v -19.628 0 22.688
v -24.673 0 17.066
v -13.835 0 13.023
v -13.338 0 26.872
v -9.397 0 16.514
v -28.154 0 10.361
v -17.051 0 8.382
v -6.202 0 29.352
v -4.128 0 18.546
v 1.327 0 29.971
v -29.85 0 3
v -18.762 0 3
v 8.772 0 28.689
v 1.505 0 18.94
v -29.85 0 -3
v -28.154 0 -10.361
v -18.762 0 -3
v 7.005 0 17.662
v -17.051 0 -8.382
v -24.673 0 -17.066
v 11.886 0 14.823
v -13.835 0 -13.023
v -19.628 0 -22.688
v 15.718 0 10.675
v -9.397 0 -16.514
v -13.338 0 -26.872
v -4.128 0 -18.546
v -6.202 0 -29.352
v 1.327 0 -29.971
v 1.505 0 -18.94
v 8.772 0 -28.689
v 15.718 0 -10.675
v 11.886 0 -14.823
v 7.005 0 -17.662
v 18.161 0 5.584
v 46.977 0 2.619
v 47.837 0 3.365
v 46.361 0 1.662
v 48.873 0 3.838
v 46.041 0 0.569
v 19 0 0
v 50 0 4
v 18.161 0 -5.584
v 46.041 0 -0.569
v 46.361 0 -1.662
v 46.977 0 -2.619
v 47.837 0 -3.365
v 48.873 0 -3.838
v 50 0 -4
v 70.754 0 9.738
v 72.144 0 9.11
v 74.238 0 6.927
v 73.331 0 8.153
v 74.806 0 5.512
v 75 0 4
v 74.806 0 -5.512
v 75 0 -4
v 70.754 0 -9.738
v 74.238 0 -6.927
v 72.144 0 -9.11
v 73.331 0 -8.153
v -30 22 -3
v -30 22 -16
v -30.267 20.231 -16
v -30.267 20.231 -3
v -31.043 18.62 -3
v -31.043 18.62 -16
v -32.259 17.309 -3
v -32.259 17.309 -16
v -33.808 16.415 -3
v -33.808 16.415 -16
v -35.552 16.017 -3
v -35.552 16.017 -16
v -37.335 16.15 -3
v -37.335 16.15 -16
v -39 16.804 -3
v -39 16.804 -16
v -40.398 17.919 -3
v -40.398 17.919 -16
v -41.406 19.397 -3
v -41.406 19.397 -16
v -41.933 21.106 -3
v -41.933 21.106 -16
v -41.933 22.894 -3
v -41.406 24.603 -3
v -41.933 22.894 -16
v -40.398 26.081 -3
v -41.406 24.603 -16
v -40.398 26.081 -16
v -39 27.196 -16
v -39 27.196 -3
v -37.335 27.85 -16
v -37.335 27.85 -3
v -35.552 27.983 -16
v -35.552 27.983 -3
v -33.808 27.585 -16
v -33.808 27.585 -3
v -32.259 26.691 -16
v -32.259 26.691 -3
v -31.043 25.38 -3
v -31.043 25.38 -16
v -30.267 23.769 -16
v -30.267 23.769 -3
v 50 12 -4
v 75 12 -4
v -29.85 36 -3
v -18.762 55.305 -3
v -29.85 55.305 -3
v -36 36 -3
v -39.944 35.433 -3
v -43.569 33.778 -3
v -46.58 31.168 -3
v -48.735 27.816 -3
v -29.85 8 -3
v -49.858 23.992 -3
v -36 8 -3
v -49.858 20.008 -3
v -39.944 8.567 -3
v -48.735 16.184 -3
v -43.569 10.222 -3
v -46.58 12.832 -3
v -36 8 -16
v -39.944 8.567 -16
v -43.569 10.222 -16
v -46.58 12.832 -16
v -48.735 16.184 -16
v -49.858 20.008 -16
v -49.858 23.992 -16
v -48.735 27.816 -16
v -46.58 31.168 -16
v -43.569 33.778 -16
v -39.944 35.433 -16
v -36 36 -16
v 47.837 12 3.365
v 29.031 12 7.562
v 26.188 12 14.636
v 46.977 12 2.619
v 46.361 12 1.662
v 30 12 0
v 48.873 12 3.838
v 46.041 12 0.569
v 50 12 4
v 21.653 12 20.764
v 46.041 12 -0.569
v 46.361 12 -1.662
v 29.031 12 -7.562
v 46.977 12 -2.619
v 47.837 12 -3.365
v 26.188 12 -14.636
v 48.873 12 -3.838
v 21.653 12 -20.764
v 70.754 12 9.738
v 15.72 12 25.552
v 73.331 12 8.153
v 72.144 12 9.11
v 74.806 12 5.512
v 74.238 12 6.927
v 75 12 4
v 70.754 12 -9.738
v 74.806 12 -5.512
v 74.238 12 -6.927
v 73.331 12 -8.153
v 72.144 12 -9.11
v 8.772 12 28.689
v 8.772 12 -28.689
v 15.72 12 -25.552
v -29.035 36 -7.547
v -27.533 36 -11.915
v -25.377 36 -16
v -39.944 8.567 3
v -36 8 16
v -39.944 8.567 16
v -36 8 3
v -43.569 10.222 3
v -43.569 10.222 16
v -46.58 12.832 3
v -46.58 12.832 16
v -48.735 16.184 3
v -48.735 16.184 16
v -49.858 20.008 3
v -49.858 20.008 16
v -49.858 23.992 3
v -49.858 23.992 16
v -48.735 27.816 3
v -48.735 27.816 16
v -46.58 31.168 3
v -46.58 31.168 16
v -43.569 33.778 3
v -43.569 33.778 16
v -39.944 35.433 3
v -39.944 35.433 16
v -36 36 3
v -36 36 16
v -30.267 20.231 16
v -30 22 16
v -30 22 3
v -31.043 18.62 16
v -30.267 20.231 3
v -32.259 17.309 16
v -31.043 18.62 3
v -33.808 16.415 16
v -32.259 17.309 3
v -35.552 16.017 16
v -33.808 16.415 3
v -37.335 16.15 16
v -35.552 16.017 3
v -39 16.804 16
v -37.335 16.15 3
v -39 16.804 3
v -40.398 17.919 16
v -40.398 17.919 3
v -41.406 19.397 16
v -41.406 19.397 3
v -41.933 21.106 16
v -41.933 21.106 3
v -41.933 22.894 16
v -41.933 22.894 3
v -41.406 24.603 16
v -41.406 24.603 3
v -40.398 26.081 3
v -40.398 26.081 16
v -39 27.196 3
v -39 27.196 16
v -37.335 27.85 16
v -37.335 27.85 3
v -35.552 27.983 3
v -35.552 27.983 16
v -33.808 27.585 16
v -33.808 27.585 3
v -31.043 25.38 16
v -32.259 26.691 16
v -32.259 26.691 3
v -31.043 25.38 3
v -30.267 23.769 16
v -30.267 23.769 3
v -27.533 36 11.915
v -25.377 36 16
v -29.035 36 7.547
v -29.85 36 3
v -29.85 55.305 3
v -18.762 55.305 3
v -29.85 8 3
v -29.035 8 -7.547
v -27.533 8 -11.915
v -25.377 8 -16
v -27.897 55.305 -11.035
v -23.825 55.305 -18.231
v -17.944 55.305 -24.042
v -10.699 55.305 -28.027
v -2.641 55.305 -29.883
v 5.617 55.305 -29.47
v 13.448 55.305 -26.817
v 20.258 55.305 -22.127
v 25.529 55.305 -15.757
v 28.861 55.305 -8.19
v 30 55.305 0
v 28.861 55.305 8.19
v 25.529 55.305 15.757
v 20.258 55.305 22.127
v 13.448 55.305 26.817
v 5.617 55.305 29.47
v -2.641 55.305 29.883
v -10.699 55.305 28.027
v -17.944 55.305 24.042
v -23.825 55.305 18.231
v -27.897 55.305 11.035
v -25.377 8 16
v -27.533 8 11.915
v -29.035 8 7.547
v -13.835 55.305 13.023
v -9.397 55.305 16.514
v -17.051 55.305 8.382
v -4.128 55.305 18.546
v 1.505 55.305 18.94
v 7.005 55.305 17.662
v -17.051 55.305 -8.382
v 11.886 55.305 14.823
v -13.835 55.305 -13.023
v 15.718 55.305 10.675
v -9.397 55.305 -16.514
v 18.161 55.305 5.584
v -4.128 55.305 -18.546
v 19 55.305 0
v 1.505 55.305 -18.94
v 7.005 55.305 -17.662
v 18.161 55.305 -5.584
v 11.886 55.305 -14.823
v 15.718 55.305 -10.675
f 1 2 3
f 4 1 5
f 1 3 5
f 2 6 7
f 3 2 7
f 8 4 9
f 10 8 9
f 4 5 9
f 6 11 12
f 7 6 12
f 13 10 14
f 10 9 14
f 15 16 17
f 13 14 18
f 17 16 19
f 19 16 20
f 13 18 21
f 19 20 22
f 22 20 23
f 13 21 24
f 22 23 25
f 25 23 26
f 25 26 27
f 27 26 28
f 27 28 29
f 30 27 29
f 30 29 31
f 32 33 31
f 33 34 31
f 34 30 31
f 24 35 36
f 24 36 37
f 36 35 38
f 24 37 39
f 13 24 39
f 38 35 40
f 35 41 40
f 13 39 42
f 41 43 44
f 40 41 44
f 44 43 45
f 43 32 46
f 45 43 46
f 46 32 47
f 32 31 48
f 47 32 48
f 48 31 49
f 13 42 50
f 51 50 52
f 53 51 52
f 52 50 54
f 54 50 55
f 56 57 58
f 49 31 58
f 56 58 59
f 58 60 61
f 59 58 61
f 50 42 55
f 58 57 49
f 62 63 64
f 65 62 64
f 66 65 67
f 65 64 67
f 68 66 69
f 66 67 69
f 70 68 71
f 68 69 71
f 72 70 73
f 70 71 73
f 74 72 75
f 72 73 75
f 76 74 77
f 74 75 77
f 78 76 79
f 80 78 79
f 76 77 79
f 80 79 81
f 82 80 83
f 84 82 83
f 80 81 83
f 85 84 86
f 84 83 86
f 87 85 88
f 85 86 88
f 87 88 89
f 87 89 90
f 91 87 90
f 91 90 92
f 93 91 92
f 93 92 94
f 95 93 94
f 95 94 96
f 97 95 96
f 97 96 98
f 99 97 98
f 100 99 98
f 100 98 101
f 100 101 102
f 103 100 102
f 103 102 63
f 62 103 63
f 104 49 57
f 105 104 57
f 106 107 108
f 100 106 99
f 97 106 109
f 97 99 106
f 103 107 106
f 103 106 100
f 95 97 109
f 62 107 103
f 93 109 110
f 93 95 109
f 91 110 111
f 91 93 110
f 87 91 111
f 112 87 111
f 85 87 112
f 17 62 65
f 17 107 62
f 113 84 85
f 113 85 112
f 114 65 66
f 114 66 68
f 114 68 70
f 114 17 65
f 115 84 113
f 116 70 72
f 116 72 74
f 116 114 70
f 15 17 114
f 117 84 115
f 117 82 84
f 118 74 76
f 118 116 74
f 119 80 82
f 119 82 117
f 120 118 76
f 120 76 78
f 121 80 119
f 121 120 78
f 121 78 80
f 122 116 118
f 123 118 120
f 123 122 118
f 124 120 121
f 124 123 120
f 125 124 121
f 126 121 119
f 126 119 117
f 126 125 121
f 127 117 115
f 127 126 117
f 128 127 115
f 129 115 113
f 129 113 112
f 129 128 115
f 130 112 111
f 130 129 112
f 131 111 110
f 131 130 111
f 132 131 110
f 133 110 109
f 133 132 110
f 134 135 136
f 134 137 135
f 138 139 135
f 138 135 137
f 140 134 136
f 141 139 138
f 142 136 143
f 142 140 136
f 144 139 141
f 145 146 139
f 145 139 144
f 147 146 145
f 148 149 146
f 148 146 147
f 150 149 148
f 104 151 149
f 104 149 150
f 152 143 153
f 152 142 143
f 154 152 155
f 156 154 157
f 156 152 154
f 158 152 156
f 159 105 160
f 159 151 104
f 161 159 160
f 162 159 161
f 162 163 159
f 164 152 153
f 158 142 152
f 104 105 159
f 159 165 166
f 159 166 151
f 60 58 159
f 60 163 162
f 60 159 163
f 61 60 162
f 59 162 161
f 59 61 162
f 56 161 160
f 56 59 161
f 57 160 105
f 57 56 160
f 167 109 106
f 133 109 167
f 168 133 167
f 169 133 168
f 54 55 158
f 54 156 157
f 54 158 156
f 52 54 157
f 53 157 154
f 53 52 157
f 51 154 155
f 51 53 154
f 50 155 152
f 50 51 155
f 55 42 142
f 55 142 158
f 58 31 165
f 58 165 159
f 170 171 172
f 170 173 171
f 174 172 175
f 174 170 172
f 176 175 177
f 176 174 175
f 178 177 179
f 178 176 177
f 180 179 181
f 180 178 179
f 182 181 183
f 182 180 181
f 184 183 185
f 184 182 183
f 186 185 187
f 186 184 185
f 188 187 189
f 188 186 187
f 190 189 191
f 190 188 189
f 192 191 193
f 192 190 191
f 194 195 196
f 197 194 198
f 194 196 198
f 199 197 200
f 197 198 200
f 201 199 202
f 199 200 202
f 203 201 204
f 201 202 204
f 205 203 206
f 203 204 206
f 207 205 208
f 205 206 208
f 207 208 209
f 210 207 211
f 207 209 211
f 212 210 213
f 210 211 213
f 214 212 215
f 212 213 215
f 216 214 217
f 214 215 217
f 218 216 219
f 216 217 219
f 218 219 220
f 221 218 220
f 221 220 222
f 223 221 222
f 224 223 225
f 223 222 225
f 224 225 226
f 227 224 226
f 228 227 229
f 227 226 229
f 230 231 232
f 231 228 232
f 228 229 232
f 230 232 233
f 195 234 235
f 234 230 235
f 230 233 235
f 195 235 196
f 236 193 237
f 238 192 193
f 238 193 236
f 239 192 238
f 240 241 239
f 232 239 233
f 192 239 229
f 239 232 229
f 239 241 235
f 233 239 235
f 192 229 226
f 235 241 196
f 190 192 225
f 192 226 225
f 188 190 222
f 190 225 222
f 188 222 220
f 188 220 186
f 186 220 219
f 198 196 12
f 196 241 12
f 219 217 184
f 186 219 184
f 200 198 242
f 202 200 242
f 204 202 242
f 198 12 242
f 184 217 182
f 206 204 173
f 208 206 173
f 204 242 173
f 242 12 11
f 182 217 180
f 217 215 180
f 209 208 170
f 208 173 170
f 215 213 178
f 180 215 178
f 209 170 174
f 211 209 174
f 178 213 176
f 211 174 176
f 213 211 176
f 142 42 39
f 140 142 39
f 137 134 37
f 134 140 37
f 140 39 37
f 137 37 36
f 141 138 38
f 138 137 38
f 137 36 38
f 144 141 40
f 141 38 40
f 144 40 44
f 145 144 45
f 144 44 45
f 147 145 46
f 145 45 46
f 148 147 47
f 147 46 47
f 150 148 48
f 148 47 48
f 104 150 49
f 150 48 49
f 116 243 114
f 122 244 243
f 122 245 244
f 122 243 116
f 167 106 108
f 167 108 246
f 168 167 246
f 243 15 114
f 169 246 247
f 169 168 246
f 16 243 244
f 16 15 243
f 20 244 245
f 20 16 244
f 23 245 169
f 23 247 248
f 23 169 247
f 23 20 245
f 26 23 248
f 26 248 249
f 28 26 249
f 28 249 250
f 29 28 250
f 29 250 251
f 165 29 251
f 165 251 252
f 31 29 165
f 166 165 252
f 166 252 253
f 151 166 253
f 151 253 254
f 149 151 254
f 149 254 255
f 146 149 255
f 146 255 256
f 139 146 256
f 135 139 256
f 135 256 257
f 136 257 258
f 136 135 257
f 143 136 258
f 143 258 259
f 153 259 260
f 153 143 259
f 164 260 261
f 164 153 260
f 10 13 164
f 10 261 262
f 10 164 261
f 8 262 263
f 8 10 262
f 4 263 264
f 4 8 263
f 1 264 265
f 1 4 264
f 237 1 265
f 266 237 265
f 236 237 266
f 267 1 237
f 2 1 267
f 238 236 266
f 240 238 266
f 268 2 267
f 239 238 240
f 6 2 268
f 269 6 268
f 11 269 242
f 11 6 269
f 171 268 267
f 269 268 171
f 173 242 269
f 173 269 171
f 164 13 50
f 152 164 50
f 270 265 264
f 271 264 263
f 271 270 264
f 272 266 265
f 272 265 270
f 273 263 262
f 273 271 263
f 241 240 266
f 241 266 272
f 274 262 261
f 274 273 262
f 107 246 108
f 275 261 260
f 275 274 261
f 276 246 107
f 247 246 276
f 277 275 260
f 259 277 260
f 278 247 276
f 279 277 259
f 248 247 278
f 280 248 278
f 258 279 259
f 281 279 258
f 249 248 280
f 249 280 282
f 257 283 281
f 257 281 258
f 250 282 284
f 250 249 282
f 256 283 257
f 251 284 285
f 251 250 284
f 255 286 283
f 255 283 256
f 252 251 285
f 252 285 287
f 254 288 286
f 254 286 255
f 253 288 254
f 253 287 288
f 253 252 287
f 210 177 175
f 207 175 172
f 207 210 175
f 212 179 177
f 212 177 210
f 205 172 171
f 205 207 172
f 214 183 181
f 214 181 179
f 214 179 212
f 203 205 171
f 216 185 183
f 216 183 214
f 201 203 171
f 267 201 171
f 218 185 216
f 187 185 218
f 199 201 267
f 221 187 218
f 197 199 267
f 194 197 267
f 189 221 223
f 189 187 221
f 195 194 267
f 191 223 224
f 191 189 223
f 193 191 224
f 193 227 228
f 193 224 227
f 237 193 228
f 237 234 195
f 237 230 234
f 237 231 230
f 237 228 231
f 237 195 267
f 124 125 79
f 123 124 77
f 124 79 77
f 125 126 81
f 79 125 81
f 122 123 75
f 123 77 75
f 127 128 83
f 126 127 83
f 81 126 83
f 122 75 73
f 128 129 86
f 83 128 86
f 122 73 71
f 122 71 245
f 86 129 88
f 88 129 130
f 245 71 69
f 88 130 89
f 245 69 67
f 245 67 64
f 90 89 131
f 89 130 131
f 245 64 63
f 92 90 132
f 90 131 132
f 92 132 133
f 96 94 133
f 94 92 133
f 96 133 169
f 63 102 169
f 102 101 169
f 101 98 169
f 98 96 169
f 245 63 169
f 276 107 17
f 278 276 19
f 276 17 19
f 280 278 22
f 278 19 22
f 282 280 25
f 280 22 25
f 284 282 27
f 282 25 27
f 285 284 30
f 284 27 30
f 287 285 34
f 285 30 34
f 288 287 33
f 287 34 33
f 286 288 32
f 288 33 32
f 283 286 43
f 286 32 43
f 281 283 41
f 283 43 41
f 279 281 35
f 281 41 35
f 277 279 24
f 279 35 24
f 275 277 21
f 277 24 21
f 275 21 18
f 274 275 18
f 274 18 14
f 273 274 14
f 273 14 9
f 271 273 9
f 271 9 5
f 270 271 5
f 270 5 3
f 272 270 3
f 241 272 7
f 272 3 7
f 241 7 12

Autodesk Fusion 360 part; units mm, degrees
sketch "Sketch1" plane through (0, 0, 0) normal (0, 1, 0) x (1, 0, 0)
  circle A0 centre (0, 0) radius 19
  circle A1 centre (0, 0) radius 30
  line L0 (0, 0) -> (50, 0) construction
  line L1 (50, 0) -> (75, 0) construction
  line L2 (50, 4) -> (75, 4)
  line L3 (50, -4) -> (75, -4)
  line L4 (8.7717, 28.689) -> (70.7543, 9.7378)
  arc A2 (75, 4) -> (70.7543, 9.7378) centre (69, 4) ccw
  arc A3 (50, 4) -> (50, -4) centre (50, 0) ccw
  line L5 (8.7717, -28.689) -> (70.7543, -9.7378)
  arc A4 (70.7543, -9.7378) -> (75, -4) centre (69, -4) ccw
  dimension "d1" = 38
  dimension "d2" = 60
  dimension "d3" = 50
  dimension "d4" = 8
  dimension "d5" = 25
  dimension "d6" = 4
  dimension "d7" = 4
  dimension "d8" = 12
extrude "Extrude1" add sketch "Sketch1" along normal blind 44 contours A1
extrude "Extrude2" add sketch "Sketch1" along normal blind 12 contours A1 L2 L3 L4 A2 A3 L5 A4
sketch "Sketch2" plane through (0, 0, 0) normal (0, 0, 1) x (1, 0, 0)
  circle A0 centre (-36, 22) radius 6
  line L0 (-36, 36) -> (-22, 36)
  line L1 (-22, 36) -> (-22, 8)
  line L2 (-22, 8) -> (-36, 8)
  arc A1 (-36, 36) -> (-36, 8) centre (-36, 22) ccw
  line L3 (30, 0) -> (-30, 0)
  dimension "d14" = 28
  dimension "d15" = 12
  dimension "d16" = 8
  dimension "d17" = 36
extrude "Extrude3" add sketch "Sketch2" along normal mid plane 32
sketch "Sketch3" plane through (0, 44, 0) normal (0, 1, 0) x (-1, 0, 0)
  circle A0 centre (0, 0) radius 19
  circle A1 centre (0, 0) radius 30
  line L0 (54, -3) -> (11, -3)
  line L1 (11, -3) -> (11, 3)
  line L2 (11, 3) -> (54, 3)
  line L3 (54, 3) -> (54, -3)
  line L4 (0, 0) -> (-50, 0)
  dimension "d20" = 3
  dimension "d21" = 3
  dimension "d22" = 11
  dimension "d23" = 43
extrude "Extrude4" cut sketch "Sketch3" against normal up to surface (44 mm away) contours A0 A1 L0 L2 | A1 L0 L2 L3
extrude "Extrude5" add 1 faces at (26.2783, 44, 0) along direction (0, 1, 0) blind 11.305
ref_plane "WorkPlane1" through (41.8858, 85.34, 0) normal (0, 1, 0) x (1, 0, 0)
ref_plane "WorkPlane2" through (0, 0, 57.35) normal (0, 0, 1) x (1, 0, 0)
